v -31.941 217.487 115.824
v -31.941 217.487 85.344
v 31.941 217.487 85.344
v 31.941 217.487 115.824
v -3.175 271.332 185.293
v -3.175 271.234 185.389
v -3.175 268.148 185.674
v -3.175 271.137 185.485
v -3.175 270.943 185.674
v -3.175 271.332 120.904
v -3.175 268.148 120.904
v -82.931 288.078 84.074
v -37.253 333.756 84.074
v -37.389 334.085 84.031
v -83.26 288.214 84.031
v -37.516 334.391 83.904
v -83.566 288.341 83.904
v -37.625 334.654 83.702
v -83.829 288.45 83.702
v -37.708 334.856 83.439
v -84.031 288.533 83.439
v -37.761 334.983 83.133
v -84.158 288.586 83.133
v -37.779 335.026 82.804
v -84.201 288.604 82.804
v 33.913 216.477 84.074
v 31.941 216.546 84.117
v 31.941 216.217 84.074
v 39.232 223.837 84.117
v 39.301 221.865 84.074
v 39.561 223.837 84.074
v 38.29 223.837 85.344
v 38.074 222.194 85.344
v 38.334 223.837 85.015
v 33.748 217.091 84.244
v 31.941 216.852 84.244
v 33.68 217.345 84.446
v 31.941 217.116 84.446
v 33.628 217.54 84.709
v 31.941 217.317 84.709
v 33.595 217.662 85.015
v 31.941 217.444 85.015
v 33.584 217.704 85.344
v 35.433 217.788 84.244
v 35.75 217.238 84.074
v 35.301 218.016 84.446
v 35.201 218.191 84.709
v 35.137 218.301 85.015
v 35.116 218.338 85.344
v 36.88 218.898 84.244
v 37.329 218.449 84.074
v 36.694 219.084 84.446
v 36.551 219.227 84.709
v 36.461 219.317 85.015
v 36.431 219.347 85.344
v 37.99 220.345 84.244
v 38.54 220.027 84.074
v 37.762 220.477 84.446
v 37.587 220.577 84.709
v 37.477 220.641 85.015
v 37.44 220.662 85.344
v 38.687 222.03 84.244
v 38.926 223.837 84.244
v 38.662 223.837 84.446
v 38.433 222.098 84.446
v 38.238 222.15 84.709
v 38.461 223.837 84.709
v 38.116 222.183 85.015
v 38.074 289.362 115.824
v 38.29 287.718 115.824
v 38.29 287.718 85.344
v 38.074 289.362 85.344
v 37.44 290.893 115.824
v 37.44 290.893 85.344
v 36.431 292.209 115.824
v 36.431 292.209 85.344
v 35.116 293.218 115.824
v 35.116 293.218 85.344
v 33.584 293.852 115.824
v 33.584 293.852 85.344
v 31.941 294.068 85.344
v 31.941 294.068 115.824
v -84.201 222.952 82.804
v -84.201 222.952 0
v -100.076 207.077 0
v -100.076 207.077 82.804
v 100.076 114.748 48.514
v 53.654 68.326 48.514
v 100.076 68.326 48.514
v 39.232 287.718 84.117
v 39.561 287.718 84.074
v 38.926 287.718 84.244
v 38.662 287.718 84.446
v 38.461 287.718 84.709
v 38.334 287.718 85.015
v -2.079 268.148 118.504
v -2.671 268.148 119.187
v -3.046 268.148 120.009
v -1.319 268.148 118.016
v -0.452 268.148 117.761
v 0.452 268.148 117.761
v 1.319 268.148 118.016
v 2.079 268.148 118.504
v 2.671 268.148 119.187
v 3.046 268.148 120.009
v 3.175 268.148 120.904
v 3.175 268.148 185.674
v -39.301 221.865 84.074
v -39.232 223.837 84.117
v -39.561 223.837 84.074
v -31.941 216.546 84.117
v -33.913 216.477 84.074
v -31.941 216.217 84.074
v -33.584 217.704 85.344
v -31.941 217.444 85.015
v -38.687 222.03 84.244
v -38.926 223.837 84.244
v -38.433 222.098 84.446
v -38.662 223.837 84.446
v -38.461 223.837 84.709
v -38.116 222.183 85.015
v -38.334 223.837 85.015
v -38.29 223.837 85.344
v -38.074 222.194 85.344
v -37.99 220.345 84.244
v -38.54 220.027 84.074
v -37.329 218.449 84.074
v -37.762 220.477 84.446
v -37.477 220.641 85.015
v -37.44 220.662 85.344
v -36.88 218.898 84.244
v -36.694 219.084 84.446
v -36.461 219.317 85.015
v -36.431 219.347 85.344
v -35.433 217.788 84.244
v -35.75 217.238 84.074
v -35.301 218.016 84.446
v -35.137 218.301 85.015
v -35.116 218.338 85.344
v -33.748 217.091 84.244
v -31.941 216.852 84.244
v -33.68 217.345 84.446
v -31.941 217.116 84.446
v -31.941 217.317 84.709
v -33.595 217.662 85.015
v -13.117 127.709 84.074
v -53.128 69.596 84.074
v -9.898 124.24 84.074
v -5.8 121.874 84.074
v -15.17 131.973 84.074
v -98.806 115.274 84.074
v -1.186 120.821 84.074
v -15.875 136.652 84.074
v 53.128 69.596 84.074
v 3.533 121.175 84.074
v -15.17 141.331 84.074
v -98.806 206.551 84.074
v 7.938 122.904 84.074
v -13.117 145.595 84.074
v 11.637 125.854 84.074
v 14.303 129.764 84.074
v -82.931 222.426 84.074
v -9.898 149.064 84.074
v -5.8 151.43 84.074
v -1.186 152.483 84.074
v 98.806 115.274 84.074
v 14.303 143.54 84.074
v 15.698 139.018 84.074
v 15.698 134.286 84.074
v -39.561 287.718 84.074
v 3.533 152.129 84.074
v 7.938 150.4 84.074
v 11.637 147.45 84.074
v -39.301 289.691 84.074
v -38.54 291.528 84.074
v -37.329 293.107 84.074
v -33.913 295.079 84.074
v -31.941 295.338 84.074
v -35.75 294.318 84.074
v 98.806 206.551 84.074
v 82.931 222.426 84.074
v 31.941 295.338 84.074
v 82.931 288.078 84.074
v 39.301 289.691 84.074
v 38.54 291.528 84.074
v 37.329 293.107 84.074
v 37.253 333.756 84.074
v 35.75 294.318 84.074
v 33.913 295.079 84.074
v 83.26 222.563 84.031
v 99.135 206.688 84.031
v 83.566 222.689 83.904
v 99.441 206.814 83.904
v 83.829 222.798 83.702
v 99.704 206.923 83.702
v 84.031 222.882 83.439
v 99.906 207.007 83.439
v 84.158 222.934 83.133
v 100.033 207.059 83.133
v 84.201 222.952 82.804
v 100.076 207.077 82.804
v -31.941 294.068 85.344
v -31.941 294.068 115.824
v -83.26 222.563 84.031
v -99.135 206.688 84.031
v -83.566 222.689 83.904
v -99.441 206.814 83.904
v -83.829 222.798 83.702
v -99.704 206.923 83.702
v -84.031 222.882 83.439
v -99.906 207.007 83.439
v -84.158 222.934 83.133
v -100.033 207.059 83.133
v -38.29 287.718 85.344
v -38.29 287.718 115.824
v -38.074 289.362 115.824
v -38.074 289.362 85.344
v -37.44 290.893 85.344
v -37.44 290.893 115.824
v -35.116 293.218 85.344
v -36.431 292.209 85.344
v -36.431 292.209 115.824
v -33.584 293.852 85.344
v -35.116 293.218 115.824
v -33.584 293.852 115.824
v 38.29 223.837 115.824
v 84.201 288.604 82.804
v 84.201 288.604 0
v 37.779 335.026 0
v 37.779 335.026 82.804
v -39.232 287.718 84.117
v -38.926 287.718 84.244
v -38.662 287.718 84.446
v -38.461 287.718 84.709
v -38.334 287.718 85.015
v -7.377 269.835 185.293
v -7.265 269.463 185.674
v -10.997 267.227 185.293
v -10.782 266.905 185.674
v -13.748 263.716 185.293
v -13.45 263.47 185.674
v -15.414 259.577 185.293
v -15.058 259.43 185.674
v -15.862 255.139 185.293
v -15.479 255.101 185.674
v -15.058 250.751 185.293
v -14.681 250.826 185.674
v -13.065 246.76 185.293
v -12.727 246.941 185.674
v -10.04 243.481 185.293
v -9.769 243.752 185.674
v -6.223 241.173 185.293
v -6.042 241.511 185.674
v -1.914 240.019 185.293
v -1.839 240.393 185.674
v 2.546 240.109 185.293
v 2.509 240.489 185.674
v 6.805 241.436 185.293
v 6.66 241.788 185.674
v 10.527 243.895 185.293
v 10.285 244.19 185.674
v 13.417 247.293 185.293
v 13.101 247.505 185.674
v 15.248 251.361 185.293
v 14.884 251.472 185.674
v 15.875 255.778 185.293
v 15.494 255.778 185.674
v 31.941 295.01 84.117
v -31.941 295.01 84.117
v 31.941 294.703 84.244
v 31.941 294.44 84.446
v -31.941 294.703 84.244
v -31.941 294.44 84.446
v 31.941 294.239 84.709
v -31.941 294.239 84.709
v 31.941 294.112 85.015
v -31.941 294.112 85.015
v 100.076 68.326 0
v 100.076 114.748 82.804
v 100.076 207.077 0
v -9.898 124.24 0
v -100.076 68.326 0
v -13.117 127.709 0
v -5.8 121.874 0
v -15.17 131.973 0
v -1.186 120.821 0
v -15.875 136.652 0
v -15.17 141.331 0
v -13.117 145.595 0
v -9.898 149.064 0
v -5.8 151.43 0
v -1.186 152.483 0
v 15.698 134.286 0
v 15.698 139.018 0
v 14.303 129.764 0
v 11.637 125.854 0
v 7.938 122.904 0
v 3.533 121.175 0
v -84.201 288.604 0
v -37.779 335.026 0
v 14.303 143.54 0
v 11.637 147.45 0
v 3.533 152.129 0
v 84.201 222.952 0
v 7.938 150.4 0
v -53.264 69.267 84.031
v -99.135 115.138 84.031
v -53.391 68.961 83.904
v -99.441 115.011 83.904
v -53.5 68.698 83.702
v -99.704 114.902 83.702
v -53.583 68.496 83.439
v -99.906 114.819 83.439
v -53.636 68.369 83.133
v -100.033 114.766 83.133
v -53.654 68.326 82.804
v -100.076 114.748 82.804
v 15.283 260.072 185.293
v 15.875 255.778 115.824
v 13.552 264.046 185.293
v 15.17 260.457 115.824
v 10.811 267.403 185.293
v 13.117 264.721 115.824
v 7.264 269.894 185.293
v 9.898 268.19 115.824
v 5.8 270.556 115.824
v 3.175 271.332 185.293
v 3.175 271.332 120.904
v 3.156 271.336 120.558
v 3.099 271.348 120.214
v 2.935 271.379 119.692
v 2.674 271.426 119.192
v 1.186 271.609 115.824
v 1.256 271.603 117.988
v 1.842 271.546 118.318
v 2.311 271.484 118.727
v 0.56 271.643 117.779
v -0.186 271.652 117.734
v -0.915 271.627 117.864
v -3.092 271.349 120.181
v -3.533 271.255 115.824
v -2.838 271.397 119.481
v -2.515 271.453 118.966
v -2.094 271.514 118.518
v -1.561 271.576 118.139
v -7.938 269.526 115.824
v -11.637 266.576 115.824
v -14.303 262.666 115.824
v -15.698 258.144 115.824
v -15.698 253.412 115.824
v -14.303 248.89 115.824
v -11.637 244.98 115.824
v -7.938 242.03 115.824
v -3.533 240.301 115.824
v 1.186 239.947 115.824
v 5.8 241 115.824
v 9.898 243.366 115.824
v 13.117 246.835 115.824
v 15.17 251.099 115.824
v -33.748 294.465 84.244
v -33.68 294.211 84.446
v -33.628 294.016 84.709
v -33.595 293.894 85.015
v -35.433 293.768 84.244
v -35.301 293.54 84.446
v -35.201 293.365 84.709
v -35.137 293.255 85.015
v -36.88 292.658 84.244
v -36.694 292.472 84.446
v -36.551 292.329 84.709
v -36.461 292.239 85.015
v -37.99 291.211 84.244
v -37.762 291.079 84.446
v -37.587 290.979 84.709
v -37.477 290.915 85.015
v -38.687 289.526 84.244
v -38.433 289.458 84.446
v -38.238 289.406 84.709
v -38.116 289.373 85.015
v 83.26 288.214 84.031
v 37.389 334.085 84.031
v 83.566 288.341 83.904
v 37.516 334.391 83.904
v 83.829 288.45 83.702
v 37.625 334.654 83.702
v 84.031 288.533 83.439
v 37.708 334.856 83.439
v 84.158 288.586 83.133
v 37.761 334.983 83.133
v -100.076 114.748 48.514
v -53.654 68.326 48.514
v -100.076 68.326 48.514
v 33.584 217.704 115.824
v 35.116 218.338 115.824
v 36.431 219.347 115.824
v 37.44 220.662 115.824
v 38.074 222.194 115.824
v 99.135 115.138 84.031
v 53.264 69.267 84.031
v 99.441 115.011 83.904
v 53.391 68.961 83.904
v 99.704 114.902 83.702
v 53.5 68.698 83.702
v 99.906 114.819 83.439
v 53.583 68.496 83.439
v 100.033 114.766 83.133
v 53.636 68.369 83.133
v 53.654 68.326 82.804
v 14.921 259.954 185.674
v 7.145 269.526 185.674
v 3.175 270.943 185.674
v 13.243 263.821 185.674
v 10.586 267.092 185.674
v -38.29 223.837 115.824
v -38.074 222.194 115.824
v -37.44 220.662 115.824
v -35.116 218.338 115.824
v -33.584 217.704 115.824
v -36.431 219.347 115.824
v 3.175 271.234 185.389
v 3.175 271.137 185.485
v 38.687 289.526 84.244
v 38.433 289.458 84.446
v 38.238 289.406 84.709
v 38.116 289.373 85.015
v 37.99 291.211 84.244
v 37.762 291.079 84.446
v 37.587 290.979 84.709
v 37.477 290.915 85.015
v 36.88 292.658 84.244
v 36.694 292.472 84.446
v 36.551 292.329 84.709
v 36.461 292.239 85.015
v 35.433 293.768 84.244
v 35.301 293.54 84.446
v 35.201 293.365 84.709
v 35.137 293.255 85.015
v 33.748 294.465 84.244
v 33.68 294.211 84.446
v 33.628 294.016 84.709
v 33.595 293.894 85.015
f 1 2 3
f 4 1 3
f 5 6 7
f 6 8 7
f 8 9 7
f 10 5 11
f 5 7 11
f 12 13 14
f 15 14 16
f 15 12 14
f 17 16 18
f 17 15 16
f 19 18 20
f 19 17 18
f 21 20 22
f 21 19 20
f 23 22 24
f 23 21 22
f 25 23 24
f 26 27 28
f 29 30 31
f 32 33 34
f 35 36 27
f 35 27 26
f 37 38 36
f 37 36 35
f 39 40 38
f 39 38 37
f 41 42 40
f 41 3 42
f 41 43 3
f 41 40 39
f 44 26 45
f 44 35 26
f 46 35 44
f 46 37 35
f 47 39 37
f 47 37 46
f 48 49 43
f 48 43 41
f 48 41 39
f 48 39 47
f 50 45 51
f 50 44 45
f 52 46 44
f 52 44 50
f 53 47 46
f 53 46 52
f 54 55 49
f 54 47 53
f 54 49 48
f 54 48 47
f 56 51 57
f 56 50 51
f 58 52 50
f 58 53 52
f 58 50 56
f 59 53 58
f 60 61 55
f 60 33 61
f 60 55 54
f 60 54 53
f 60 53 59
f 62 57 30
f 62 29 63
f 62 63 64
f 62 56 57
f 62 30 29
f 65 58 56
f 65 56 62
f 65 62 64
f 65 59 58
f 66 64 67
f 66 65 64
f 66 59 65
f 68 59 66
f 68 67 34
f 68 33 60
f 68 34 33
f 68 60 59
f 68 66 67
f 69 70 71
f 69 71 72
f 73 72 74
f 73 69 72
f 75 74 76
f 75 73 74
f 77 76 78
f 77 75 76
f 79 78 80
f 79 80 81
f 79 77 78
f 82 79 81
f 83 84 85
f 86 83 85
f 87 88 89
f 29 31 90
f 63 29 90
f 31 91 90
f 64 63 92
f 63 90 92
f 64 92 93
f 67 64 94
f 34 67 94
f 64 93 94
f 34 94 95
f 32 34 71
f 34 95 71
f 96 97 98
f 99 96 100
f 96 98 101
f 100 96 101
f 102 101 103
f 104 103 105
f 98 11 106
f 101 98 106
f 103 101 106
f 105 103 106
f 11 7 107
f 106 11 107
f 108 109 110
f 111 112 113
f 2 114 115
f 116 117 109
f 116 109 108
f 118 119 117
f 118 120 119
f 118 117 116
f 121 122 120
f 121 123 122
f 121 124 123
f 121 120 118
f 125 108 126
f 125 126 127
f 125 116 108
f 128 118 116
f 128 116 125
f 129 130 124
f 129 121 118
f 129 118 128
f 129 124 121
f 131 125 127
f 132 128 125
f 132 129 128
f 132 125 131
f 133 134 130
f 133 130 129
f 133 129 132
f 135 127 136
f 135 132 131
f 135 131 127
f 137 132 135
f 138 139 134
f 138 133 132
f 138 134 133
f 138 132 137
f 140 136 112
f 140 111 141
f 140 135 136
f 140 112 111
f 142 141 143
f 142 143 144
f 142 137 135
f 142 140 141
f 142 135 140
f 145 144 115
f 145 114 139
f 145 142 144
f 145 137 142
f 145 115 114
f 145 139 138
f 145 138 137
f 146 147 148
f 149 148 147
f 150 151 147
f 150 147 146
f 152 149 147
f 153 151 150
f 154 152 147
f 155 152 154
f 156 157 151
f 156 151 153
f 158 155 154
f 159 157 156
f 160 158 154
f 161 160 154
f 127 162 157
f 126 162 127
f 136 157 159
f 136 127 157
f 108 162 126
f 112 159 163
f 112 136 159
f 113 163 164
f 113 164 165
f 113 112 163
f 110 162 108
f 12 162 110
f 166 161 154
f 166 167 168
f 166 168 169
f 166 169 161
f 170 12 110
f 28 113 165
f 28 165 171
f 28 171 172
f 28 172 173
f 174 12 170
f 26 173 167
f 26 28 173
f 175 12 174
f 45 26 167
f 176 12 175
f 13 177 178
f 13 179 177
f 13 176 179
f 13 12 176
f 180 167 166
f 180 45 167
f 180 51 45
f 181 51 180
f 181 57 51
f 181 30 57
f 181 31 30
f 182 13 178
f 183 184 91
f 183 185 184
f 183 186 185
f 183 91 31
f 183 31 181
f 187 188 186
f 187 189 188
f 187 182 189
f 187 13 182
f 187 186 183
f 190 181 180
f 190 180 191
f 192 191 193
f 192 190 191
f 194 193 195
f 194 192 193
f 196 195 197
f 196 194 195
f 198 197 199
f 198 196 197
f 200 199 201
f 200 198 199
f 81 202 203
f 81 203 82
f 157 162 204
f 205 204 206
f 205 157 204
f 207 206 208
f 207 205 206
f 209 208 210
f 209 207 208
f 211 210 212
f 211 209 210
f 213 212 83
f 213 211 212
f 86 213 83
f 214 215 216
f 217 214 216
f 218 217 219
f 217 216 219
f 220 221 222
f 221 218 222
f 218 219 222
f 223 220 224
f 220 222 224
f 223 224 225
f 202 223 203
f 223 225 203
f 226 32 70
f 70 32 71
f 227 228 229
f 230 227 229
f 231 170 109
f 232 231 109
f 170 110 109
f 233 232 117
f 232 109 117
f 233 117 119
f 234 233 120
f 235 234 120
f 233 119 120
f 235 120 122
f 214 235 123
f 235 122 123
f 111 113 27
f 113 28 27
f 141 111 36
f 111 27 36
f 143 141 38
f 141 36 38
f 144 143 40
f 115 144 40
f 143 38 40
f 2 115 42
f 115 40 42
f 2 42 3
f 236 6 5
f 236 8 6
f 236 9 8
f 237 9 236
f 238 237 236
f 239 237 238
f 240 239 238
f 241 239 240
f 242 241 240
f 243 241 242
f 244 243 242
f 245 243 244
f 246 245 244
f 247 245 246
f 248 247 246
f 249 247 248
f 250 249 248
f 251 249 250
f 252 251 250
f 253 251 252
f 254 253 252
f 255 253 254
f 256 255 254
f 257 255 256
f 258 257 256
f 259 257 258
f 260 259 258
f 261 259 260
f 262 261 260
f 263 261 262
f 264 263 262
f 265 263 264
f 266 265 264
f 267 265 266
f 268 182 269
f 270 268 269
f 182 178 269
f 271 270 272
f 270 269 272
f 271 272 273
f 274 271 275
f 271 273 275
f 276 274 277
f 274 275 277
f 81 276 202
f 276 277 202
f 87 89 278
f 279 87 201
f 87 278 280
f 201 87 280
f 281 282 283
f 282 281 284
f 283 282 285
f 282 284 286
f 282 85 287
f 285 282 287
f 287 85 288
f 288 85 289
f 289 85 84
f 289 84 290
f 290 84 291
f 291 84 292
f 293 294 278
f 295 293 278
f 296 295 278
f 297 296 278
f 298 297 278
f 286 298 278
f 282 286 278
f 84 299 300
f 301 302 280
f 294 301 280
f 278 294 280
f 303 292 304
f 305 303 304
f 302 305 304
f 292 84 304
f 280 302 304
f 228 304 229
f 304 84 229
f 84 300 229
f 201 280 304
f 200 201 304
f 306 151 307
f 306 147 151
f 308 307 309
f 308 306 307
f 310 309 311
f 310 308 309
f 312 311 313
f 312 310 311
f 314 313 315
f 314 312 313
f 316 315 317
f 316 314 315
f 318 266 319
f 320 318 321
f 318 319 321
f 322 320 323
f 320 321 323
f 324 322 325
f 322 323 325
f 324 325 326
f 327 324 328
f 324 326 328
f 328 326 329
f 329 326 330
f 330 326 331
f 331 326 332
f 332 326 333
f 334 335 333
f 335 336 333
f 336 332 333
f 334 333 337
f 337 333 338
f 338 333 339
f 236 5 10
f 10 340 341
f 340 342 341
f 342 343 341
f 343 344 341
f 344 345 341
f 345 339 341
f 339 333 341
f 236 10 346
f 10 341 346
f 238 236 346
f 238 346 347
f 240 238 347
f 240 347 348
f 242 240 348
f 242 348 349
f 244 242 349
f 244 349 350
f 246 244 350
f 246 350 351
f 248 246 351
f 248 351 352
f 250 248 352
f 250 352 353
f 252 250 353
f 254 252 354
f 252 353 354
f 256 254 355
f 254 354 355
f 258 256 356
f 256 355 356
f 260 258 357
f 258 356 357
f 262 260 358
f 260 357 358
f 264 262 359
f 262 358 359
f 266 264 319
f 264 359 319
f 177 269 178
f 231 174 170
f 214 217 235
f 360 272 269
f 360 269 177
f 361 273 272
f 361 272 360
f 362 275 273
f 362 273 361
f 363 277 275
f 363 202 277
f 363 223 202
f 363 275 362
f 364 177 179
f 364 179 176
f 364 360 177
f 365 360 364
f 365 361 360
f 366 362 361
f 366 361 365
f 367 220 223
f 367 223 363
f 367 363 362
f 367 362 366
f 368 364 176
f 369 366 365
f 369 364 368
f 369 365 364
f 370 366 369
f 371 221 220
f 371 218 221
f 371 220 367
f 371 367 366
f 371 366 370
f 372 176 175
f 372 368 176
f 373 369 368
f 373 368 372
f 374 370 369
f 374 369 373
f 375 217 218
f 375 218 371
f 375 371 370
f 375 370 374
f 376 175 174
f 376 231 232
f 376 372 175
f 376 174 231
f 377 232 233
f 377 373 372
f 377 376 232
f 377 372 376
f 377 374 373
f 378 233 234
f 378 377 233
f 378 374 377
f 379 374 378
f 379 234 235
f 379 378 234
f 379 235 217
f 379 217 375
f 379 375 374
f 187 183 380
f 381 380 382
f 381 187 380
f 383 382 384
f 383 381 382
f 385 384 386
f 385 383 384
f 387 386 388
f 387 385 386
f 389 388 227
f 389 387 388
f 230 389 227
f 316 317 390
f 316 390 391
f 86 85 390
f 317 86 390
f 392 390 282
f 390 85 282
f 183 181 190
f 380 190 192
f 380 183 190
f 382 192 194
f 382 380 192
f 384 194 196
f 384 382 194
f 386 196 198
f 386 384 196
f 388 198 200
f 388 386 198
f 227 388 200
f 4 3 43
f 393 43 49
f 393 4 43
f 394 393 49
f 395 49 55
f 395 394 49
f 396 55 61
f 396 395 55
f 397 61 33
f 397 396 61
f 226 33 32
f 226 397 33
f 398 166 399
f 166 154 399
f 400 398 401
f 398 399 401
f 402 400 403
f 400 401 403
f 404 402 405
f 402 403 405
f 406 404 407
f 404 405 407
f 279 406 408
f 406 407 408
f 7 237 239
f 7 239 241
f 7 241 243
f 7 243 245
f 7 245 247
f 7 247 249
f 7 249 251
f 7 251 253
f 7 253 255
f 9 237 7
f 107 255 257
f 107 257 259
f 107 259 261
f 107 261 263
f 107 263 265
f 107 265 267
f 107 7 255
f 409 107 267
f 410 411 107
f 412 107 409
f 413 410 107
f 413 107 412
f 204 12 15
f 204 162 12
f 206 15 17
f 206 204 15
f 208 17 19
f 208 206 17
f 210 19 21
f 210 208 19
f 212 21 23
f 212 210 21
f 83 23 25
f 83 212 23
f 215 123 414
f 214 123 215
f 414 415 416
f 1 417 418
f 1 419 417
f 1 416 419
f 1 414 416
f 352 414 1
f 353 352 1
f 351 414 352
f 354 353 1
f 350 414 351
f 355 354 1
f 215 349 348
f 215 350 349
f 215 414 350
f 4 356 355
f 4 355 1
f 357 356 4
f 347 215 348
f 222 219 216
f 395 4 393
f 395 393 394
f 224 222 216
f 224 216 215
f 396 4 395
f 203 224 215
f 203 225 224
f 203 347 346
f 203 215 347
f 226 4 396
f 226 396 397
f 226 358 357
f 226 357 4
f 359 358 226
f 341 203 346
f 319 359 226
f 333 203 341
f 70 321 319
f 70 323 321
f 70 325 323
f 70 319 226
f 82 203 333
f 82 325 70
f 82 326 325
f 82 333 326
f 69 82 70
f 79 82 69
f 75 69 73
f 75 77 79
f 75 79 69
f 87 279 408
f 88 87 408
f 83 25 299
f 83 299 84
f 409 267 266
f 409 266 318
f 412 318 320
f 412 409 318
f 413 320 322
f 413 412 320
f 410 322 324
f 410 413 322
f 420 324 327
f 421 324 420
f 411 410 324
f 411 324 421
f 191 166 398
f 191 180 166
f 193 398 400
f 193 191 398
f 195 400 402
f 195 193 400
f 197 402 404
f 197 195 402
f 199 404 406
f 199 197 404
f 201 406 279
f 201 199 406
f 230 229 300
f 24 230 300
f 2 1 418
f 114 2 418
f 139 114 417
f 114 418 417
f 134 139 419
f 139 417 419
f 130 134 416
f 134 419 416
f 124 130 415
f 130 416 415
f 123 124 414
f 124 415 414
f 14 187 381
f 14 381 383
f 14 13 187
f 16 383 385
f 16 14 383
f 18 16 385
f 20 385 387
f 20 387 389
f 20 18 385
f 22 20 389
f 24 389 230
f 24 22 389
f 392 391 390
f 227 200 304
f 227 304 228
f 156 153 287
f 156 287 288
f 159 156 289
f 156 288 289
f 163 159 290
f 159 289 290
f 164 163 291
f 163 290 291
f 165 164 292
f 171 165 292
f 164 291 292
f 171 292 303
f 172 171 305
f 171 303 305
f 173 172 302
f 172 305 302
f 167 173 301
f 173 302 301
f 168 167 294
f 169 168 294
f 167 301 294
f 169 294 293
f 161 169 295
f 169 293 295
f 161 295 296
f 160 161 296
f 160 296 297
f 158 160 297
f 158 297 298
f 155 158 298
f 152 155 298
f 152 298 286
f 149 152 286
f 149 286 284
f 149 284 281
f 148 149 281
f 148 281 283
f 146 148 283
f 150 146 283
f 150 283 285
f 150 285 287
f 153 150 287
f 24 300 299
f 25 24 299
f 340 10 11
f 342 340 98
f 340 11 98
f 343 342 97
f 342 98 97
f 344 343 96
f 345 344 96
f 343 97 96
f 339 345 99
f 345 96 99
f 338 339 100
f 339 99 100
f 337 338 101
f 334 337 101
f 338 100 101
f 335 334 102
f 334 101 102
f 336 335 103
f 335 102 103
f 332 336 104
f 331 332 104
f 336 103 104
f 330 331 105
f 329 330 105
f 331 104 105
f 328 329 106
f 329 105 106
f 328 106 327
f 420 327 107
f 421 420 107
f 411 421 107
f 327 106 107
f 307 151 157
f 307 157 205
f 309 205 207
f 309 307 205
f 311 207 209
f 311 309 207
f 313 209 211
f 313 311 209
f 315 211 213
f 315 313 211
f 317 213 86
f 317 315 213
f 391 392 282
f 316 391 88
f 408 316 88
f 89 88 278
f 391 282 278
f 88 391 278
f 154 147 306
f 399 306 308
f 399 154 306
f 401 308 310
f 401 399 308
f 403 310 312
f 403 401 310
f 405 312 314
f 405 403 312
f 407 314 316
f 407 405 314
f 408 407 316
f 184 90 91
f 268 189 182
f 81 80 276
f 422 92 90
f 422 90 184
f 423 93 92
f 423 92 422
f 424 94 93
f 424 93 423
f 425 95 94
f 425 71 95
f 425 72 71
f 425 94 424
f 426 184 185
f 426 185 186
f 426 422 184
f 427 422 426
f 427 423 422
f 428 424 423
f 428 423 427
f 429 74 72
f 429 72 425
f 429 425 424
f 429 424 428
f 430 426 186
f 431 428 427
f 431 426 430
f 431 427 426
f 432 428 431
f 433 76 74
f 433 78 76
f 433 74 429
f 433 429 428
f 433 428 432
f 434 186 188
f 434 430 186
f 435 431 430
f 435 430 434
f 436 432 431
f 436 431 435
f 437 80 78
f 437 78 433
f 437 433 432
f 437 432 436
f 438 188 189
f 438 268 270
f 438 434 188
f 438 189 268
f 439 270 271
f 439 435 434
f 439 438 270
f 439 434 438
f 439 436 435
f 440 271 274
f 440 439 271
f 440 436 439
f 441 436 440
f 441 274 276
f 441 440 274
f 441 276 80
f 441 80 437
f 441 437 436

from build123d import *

# Parameters (mm, degrees)
BOSS_EXTRUDE1_DEPTH = 84.074
SKETCH3_W           = 76.581
SKETCH3_H           = 76.581
BOSS_EXTRUDE2_DEPTH = 31.75
SKETCH_D_R          = 15.875
BOSS_EXTRUDE3_DEPTH = 69.85
CUT_EXTRUDE1_DEPTH  = 35.56
FILLET1_R           = 6.35
FILLET2_R           = 1.27
KEYWAY_START        = 12.3698
KEYWAY_DEPTH        = 67.8782
CHAMFER1_SIZE       = 0.381
SKETCH7_R           = 15.875
CUT_EXTRUDE3_DEPTH  = 186.674


with BuildPart() as part:
    # L,M → Boss-Extrude1 (new body)
    with BuildSketch(Plane.XY):
        Polygon((-100.076, 68.326), (100.076, 68.326), (100.076, 207.077403609), (84.201, 222.952403609), (84.201, 288.603596391), (37.778596391, 335.026), (-37.778596391, 335.026), (-84.201, 288.603596391), (-84.201, 222.952403609), (-100.076, 207.077403609), align=None)
    extrude(amount=BOSS_EXTRUDE1_DEPTH)

    # Sketch3 → Boss-Extrude2 (add)
    with BuildSketch(Plane.XY.offset(84.074)):
        with Locations((0, 255.778)):
            Rectangle(SKETCH3_W, SKETCH3_H)
    extrude(amount=BOSS_EXTRUDE2_DEPTH)

    # D → Boss-Extrude3 (add)
    with BuildSketch(Plane.XY.offset(115.824)):
        with Locations((0, 255.778)):
            Circle(SKETCH_D_R)
    extrude(amount=BOSS_EXTRUDE3_DEPTH)

    # Sketch5 → Cut-Extrude1 (cut)
    with BuildSketch(Plane.XY.offset(84.074)):
        Polygon((100.076, 114.748403609), (53.653596391, 68.326), (100.076, 68.326), align=None)
        Polygon((-100.076, 68.326), (-100.076, 114.748403609), (-53.653596391, 68.326), align=None)
    extrude(amount=-CUT_EXTRUDE1_DEPTH, mode=Mode.SUBTRACT)

    # Fillet1
    fillet1_edges = [part.edges().sort_by_distance(p)[0] for p in [
        (-38.2905, 294.0685, 99.949),
        (-38.2905, 217.4875, 99.949),
        (38.2905, 217.4875, 99.949),
        (38.2905, 294.0685, 99.949),
    ]]
    fillet(fillet1_edges, radius=FILLET1_R)

    # Fillet2
    fillet2_edges = [part.edges().sort_by_distance(p)[0] for p in [
        (100.076, 160.912903609, 84.074),
        (76.864798195, 91.537201805, 84.074),
        (92.1385, 215.014903609, 84.074),
        (84.201, 255.778, 84.074),
        (60.989798195, 311.814798195, 84.074),
        (0, 335.026, 84.074),
        (0, 68.326, 84.074),
        (-60.989798195, 311.814798195, 84.074),
        (-84.201, 255.778, 84.074),
        (-92.1385, 215.014903609, 84.074),
        (-100.076, 160.912903609, 84.074),
        (-76.864798195, 91.537201805, 84.074),
        (0, 217.4875, 84.074),
        (-38.2905, 255.778, 84.074),
        (38.2905, 255.778, 84.074),
        (0, 294.0685, 84.074),
        (-36.430628061, 219.347371939, 84.074),
        (36.430628061, 219.347371939, 84.074),
        (-36.430628061, 292.208628061, 84.074),
        (36.430628061, 292.208628061, 84.074),
    ]]
    fillet(fillet2_edges, radius=FILLET2_R)

    # Sketch6 → Keyway (cut, through all)
    with BuildSketch(Plane(origin=(0, 255.778, 0), x_dir=(-1, 0, 0), z_dir=(0, 1, 0)).offset(KEYWAY_START)):
        with BuildLine():
            Line((3.175, 185.674), (3.175, 120.904))
            ThreePointArc((3.175, 120.904), (0, 117.729), (-3.175, 120.904))
            Line((-3.175, 120.904), (-3.175, 185.674))
            ThreePointArc((-3.175, 185.674), (0, 188.849), (3.175, 185.674))
        make_face()
    extrude(amount=KEYWAY_DEPTH, mode=Mode.SUBTRACT)

    # Chamfer1
    chamfer1_edges = [part.edges().sort_by_distance(p)[0] for p in [
        (-10.040231571, 243.481277876, 185.674),
    ]]
    chamfer(chamfer1_edges, length=CHAMFER1_SIZE)

    # Sketch7 → Cut-Extrude3 (cut, through all)
    with BuildSketch(Plane(origin=(0, 0, 0), x_dir=(-1, 0, 0), z_dir=(0, 0, -1))):
        with Locations((0, 136.652)):
            Circle(SKETCH7_R)
    extrude(amount=-CUT_EXTRUDE3_DEPTH, mode=Mode.SUBTRACT)


solid = part.part
